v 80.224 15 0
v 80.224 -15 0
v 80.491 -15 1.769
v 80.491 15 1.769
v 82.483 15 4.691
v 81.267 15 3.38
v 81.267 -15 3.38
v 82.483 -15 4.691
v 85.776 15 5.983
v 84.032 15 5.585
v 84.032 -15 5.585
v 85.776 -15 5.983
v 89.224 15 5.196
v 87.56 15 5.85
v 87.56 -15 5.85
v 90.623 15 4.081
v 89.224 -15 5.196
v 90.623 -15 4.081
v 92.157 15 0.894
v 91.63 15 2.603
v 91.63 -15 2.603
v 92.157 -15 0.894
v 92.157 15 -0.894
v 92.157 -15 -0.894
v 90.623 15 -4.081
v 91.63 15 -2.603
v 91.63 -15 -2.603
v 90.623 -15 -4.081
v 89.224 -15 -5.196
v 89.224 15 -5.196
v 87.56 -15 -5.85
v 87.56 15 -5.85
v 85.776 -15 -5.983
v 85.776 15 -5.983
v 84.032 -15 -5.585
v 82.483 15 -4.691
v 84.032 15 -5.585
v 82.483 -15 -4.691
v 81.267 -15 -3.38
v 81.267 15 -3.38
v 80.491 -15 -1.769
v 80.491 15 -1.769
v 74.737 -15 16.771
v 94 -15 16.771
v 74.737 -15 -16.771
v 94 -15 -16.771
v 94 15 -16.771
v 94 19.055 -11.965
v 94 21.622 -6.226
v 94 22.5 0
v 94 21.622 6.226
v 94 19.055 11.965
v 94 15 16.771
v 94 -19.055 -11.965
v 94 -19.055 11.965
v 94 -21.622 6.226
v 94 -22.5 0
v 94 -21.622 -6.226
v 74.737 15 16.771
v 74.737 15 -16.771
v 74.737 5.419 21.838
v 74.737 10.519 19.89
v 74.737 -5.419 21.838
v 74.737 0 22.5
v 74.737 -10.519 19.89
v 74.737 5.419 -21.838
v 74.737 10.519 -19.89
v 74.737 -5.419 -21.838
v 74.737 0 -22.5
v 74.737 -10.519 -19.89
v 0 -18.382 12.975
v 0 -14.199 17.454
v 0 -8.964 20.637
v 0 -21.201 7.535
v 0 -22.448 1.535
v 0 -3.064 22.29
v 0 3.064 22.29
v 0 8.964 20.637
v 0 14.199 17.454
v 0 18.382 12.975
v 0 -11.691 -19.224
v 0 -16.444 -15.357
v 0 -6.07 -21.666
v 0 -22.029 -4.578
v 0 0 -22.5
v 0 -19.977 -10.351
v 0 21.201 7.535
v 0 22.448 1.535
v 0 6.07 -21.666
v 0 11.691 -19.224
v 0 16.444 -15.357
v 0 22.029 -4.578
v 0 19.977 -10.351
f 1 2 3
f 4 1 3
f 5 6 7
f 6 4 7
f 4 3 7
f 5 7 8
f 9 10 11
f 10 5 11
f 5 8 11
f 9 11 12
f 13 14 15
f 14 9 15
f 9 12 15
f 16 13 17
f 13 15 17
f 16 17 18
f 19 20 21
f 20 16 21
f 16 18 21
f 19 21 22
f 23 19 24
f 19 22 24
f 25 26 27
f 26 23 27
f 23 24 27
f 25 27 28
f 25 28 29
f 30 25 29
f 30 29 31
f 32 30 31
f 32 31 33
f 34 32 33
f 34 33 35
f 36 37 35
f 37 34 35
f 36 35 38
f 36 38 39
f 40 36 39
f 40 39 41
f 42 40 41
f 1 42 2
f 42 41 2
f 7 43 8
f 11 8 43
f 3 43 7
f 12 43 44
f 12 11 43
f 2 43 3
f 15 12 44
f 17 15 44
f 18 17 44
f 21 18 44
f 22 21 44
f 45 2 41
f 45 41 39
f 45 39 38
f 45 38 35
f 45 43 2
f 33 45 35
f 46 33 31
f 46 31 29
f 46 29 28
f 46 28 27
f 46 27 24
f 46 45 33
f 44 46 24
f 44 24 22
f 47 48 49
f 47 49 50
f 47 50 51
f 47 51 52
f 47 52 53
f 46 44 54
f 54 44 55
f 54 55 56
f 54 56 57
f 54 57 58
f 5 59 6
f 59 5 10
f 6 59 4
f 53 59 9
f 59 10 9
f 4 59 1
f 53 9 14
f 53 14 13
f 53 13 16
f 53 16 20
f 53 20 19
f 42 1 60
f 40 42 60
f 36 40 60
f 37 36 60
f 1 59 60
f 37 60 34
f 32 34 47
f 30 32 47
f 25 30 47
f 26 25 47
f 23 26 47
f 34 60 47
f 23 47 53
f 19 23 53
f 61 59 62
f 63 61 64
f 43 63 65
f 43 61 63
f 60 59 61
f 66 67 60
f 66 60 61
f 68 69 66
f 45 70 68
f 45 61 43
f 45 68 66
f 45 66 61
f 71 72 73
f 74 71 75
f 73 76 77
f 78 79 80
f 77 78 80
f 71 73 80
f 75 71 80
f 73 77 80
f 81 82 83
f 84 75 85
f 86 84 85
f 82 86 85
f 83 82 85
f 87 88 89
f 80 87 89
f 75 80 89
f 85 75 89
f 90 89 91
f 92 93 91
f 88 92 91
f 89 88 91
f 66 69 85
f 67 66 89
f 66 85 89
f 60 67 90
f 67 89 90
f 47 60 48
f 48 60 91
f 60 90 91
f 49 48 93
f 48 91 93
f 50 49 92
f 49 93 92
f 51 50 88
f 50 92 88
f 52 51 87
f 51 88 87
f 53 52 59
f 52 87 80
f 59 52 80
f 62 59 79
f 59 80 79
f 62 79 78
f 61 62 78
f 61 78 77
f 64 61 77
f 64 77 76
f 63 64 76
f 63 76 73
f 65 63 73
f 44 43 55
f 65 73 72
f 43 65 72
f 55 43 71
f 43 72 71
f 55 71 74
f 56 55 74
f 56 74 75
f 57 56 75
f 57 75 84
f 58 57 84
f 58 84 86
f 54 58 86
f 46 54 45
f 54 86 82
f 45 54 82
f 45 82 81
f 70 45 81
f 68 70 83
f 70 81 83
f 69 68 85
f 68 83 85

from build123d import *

# Parameters (mm, degrees)
SKETCH_2_R               = 22.5
EXTRUDE_1_DEPTH          = 94
CUT_EXTRUDE_1_DEPTH      = 53
CUT_EXTRUDE_1_DEPTH_BACK = 53
SKETCH_3_W               = 19.263131719
SKETCH_3_H               = 15
EXTRUDE_3_DEPTH          = 16
EXTRUDE_3_DEPTH_BACK     = 19


with BuildPart() as part:
    # 草图2 → 凸台-拉伸1 (new body)
    with BuildSketch(Plane(origin=(0, 0, 0), x_dir=(0, 0, -1), z_dir=(1, 0, 0))):
        Circle(SKETCH_2_R)
    extrude(amount=EXTRUDE_1_DEPTH)

    # 草图3 → 切除-拉伸1 (cut, two sides: drawn at the far end of the back side and taken through both)
    with BuildSketch(Plane.XY.offset(-CUT_EXTRUDE_1_DEPTH_BACK)):
        with Locations((84.36843414, 7.5)):
            Rectangle(SKETCH_3_W, SKETCH_3_H)
        with Locations((84.36843414, -7.5)):
            Rectangle(SKETCH_3_W, SKETCH_3_H)
    extrude(amount=CUT_EXTRUDE_1_DEPTH + CUT_EXTRUDE_1_DEPTH_BACK, mode=Mode.SUBTRACT)

    # 草图4 → 凸台-拉伸3 (add, two sides: drawn at the far end of the back side and taken through both)
    with BuildSketch(Plane(origin=(0, 0, 0), x_dir=(1, 0, 0), z_dir=(0, 1, 0)).offset(-EXTRUDE_3_DEPTH_BACK)):
        with BuildLine():
            ThreePointArc((92.224417763, 0), (86.224417763, 6), (80.224417763, 0))
            Line((80.224417763, 0), (92.224417763, 0))
        make_face()
        with BuildLine():
            Line((92.224417763, 0), (80.224417763, 0))
            ThreePointArc((80.224417763, 0), (86.224417763, -6), (92.224417763, 0))
        make_face()
    extrude(amount=EXTRUDE_3_DEPTH + EXTRUDE_3_DEPTH_BACK)


solid = part.part
